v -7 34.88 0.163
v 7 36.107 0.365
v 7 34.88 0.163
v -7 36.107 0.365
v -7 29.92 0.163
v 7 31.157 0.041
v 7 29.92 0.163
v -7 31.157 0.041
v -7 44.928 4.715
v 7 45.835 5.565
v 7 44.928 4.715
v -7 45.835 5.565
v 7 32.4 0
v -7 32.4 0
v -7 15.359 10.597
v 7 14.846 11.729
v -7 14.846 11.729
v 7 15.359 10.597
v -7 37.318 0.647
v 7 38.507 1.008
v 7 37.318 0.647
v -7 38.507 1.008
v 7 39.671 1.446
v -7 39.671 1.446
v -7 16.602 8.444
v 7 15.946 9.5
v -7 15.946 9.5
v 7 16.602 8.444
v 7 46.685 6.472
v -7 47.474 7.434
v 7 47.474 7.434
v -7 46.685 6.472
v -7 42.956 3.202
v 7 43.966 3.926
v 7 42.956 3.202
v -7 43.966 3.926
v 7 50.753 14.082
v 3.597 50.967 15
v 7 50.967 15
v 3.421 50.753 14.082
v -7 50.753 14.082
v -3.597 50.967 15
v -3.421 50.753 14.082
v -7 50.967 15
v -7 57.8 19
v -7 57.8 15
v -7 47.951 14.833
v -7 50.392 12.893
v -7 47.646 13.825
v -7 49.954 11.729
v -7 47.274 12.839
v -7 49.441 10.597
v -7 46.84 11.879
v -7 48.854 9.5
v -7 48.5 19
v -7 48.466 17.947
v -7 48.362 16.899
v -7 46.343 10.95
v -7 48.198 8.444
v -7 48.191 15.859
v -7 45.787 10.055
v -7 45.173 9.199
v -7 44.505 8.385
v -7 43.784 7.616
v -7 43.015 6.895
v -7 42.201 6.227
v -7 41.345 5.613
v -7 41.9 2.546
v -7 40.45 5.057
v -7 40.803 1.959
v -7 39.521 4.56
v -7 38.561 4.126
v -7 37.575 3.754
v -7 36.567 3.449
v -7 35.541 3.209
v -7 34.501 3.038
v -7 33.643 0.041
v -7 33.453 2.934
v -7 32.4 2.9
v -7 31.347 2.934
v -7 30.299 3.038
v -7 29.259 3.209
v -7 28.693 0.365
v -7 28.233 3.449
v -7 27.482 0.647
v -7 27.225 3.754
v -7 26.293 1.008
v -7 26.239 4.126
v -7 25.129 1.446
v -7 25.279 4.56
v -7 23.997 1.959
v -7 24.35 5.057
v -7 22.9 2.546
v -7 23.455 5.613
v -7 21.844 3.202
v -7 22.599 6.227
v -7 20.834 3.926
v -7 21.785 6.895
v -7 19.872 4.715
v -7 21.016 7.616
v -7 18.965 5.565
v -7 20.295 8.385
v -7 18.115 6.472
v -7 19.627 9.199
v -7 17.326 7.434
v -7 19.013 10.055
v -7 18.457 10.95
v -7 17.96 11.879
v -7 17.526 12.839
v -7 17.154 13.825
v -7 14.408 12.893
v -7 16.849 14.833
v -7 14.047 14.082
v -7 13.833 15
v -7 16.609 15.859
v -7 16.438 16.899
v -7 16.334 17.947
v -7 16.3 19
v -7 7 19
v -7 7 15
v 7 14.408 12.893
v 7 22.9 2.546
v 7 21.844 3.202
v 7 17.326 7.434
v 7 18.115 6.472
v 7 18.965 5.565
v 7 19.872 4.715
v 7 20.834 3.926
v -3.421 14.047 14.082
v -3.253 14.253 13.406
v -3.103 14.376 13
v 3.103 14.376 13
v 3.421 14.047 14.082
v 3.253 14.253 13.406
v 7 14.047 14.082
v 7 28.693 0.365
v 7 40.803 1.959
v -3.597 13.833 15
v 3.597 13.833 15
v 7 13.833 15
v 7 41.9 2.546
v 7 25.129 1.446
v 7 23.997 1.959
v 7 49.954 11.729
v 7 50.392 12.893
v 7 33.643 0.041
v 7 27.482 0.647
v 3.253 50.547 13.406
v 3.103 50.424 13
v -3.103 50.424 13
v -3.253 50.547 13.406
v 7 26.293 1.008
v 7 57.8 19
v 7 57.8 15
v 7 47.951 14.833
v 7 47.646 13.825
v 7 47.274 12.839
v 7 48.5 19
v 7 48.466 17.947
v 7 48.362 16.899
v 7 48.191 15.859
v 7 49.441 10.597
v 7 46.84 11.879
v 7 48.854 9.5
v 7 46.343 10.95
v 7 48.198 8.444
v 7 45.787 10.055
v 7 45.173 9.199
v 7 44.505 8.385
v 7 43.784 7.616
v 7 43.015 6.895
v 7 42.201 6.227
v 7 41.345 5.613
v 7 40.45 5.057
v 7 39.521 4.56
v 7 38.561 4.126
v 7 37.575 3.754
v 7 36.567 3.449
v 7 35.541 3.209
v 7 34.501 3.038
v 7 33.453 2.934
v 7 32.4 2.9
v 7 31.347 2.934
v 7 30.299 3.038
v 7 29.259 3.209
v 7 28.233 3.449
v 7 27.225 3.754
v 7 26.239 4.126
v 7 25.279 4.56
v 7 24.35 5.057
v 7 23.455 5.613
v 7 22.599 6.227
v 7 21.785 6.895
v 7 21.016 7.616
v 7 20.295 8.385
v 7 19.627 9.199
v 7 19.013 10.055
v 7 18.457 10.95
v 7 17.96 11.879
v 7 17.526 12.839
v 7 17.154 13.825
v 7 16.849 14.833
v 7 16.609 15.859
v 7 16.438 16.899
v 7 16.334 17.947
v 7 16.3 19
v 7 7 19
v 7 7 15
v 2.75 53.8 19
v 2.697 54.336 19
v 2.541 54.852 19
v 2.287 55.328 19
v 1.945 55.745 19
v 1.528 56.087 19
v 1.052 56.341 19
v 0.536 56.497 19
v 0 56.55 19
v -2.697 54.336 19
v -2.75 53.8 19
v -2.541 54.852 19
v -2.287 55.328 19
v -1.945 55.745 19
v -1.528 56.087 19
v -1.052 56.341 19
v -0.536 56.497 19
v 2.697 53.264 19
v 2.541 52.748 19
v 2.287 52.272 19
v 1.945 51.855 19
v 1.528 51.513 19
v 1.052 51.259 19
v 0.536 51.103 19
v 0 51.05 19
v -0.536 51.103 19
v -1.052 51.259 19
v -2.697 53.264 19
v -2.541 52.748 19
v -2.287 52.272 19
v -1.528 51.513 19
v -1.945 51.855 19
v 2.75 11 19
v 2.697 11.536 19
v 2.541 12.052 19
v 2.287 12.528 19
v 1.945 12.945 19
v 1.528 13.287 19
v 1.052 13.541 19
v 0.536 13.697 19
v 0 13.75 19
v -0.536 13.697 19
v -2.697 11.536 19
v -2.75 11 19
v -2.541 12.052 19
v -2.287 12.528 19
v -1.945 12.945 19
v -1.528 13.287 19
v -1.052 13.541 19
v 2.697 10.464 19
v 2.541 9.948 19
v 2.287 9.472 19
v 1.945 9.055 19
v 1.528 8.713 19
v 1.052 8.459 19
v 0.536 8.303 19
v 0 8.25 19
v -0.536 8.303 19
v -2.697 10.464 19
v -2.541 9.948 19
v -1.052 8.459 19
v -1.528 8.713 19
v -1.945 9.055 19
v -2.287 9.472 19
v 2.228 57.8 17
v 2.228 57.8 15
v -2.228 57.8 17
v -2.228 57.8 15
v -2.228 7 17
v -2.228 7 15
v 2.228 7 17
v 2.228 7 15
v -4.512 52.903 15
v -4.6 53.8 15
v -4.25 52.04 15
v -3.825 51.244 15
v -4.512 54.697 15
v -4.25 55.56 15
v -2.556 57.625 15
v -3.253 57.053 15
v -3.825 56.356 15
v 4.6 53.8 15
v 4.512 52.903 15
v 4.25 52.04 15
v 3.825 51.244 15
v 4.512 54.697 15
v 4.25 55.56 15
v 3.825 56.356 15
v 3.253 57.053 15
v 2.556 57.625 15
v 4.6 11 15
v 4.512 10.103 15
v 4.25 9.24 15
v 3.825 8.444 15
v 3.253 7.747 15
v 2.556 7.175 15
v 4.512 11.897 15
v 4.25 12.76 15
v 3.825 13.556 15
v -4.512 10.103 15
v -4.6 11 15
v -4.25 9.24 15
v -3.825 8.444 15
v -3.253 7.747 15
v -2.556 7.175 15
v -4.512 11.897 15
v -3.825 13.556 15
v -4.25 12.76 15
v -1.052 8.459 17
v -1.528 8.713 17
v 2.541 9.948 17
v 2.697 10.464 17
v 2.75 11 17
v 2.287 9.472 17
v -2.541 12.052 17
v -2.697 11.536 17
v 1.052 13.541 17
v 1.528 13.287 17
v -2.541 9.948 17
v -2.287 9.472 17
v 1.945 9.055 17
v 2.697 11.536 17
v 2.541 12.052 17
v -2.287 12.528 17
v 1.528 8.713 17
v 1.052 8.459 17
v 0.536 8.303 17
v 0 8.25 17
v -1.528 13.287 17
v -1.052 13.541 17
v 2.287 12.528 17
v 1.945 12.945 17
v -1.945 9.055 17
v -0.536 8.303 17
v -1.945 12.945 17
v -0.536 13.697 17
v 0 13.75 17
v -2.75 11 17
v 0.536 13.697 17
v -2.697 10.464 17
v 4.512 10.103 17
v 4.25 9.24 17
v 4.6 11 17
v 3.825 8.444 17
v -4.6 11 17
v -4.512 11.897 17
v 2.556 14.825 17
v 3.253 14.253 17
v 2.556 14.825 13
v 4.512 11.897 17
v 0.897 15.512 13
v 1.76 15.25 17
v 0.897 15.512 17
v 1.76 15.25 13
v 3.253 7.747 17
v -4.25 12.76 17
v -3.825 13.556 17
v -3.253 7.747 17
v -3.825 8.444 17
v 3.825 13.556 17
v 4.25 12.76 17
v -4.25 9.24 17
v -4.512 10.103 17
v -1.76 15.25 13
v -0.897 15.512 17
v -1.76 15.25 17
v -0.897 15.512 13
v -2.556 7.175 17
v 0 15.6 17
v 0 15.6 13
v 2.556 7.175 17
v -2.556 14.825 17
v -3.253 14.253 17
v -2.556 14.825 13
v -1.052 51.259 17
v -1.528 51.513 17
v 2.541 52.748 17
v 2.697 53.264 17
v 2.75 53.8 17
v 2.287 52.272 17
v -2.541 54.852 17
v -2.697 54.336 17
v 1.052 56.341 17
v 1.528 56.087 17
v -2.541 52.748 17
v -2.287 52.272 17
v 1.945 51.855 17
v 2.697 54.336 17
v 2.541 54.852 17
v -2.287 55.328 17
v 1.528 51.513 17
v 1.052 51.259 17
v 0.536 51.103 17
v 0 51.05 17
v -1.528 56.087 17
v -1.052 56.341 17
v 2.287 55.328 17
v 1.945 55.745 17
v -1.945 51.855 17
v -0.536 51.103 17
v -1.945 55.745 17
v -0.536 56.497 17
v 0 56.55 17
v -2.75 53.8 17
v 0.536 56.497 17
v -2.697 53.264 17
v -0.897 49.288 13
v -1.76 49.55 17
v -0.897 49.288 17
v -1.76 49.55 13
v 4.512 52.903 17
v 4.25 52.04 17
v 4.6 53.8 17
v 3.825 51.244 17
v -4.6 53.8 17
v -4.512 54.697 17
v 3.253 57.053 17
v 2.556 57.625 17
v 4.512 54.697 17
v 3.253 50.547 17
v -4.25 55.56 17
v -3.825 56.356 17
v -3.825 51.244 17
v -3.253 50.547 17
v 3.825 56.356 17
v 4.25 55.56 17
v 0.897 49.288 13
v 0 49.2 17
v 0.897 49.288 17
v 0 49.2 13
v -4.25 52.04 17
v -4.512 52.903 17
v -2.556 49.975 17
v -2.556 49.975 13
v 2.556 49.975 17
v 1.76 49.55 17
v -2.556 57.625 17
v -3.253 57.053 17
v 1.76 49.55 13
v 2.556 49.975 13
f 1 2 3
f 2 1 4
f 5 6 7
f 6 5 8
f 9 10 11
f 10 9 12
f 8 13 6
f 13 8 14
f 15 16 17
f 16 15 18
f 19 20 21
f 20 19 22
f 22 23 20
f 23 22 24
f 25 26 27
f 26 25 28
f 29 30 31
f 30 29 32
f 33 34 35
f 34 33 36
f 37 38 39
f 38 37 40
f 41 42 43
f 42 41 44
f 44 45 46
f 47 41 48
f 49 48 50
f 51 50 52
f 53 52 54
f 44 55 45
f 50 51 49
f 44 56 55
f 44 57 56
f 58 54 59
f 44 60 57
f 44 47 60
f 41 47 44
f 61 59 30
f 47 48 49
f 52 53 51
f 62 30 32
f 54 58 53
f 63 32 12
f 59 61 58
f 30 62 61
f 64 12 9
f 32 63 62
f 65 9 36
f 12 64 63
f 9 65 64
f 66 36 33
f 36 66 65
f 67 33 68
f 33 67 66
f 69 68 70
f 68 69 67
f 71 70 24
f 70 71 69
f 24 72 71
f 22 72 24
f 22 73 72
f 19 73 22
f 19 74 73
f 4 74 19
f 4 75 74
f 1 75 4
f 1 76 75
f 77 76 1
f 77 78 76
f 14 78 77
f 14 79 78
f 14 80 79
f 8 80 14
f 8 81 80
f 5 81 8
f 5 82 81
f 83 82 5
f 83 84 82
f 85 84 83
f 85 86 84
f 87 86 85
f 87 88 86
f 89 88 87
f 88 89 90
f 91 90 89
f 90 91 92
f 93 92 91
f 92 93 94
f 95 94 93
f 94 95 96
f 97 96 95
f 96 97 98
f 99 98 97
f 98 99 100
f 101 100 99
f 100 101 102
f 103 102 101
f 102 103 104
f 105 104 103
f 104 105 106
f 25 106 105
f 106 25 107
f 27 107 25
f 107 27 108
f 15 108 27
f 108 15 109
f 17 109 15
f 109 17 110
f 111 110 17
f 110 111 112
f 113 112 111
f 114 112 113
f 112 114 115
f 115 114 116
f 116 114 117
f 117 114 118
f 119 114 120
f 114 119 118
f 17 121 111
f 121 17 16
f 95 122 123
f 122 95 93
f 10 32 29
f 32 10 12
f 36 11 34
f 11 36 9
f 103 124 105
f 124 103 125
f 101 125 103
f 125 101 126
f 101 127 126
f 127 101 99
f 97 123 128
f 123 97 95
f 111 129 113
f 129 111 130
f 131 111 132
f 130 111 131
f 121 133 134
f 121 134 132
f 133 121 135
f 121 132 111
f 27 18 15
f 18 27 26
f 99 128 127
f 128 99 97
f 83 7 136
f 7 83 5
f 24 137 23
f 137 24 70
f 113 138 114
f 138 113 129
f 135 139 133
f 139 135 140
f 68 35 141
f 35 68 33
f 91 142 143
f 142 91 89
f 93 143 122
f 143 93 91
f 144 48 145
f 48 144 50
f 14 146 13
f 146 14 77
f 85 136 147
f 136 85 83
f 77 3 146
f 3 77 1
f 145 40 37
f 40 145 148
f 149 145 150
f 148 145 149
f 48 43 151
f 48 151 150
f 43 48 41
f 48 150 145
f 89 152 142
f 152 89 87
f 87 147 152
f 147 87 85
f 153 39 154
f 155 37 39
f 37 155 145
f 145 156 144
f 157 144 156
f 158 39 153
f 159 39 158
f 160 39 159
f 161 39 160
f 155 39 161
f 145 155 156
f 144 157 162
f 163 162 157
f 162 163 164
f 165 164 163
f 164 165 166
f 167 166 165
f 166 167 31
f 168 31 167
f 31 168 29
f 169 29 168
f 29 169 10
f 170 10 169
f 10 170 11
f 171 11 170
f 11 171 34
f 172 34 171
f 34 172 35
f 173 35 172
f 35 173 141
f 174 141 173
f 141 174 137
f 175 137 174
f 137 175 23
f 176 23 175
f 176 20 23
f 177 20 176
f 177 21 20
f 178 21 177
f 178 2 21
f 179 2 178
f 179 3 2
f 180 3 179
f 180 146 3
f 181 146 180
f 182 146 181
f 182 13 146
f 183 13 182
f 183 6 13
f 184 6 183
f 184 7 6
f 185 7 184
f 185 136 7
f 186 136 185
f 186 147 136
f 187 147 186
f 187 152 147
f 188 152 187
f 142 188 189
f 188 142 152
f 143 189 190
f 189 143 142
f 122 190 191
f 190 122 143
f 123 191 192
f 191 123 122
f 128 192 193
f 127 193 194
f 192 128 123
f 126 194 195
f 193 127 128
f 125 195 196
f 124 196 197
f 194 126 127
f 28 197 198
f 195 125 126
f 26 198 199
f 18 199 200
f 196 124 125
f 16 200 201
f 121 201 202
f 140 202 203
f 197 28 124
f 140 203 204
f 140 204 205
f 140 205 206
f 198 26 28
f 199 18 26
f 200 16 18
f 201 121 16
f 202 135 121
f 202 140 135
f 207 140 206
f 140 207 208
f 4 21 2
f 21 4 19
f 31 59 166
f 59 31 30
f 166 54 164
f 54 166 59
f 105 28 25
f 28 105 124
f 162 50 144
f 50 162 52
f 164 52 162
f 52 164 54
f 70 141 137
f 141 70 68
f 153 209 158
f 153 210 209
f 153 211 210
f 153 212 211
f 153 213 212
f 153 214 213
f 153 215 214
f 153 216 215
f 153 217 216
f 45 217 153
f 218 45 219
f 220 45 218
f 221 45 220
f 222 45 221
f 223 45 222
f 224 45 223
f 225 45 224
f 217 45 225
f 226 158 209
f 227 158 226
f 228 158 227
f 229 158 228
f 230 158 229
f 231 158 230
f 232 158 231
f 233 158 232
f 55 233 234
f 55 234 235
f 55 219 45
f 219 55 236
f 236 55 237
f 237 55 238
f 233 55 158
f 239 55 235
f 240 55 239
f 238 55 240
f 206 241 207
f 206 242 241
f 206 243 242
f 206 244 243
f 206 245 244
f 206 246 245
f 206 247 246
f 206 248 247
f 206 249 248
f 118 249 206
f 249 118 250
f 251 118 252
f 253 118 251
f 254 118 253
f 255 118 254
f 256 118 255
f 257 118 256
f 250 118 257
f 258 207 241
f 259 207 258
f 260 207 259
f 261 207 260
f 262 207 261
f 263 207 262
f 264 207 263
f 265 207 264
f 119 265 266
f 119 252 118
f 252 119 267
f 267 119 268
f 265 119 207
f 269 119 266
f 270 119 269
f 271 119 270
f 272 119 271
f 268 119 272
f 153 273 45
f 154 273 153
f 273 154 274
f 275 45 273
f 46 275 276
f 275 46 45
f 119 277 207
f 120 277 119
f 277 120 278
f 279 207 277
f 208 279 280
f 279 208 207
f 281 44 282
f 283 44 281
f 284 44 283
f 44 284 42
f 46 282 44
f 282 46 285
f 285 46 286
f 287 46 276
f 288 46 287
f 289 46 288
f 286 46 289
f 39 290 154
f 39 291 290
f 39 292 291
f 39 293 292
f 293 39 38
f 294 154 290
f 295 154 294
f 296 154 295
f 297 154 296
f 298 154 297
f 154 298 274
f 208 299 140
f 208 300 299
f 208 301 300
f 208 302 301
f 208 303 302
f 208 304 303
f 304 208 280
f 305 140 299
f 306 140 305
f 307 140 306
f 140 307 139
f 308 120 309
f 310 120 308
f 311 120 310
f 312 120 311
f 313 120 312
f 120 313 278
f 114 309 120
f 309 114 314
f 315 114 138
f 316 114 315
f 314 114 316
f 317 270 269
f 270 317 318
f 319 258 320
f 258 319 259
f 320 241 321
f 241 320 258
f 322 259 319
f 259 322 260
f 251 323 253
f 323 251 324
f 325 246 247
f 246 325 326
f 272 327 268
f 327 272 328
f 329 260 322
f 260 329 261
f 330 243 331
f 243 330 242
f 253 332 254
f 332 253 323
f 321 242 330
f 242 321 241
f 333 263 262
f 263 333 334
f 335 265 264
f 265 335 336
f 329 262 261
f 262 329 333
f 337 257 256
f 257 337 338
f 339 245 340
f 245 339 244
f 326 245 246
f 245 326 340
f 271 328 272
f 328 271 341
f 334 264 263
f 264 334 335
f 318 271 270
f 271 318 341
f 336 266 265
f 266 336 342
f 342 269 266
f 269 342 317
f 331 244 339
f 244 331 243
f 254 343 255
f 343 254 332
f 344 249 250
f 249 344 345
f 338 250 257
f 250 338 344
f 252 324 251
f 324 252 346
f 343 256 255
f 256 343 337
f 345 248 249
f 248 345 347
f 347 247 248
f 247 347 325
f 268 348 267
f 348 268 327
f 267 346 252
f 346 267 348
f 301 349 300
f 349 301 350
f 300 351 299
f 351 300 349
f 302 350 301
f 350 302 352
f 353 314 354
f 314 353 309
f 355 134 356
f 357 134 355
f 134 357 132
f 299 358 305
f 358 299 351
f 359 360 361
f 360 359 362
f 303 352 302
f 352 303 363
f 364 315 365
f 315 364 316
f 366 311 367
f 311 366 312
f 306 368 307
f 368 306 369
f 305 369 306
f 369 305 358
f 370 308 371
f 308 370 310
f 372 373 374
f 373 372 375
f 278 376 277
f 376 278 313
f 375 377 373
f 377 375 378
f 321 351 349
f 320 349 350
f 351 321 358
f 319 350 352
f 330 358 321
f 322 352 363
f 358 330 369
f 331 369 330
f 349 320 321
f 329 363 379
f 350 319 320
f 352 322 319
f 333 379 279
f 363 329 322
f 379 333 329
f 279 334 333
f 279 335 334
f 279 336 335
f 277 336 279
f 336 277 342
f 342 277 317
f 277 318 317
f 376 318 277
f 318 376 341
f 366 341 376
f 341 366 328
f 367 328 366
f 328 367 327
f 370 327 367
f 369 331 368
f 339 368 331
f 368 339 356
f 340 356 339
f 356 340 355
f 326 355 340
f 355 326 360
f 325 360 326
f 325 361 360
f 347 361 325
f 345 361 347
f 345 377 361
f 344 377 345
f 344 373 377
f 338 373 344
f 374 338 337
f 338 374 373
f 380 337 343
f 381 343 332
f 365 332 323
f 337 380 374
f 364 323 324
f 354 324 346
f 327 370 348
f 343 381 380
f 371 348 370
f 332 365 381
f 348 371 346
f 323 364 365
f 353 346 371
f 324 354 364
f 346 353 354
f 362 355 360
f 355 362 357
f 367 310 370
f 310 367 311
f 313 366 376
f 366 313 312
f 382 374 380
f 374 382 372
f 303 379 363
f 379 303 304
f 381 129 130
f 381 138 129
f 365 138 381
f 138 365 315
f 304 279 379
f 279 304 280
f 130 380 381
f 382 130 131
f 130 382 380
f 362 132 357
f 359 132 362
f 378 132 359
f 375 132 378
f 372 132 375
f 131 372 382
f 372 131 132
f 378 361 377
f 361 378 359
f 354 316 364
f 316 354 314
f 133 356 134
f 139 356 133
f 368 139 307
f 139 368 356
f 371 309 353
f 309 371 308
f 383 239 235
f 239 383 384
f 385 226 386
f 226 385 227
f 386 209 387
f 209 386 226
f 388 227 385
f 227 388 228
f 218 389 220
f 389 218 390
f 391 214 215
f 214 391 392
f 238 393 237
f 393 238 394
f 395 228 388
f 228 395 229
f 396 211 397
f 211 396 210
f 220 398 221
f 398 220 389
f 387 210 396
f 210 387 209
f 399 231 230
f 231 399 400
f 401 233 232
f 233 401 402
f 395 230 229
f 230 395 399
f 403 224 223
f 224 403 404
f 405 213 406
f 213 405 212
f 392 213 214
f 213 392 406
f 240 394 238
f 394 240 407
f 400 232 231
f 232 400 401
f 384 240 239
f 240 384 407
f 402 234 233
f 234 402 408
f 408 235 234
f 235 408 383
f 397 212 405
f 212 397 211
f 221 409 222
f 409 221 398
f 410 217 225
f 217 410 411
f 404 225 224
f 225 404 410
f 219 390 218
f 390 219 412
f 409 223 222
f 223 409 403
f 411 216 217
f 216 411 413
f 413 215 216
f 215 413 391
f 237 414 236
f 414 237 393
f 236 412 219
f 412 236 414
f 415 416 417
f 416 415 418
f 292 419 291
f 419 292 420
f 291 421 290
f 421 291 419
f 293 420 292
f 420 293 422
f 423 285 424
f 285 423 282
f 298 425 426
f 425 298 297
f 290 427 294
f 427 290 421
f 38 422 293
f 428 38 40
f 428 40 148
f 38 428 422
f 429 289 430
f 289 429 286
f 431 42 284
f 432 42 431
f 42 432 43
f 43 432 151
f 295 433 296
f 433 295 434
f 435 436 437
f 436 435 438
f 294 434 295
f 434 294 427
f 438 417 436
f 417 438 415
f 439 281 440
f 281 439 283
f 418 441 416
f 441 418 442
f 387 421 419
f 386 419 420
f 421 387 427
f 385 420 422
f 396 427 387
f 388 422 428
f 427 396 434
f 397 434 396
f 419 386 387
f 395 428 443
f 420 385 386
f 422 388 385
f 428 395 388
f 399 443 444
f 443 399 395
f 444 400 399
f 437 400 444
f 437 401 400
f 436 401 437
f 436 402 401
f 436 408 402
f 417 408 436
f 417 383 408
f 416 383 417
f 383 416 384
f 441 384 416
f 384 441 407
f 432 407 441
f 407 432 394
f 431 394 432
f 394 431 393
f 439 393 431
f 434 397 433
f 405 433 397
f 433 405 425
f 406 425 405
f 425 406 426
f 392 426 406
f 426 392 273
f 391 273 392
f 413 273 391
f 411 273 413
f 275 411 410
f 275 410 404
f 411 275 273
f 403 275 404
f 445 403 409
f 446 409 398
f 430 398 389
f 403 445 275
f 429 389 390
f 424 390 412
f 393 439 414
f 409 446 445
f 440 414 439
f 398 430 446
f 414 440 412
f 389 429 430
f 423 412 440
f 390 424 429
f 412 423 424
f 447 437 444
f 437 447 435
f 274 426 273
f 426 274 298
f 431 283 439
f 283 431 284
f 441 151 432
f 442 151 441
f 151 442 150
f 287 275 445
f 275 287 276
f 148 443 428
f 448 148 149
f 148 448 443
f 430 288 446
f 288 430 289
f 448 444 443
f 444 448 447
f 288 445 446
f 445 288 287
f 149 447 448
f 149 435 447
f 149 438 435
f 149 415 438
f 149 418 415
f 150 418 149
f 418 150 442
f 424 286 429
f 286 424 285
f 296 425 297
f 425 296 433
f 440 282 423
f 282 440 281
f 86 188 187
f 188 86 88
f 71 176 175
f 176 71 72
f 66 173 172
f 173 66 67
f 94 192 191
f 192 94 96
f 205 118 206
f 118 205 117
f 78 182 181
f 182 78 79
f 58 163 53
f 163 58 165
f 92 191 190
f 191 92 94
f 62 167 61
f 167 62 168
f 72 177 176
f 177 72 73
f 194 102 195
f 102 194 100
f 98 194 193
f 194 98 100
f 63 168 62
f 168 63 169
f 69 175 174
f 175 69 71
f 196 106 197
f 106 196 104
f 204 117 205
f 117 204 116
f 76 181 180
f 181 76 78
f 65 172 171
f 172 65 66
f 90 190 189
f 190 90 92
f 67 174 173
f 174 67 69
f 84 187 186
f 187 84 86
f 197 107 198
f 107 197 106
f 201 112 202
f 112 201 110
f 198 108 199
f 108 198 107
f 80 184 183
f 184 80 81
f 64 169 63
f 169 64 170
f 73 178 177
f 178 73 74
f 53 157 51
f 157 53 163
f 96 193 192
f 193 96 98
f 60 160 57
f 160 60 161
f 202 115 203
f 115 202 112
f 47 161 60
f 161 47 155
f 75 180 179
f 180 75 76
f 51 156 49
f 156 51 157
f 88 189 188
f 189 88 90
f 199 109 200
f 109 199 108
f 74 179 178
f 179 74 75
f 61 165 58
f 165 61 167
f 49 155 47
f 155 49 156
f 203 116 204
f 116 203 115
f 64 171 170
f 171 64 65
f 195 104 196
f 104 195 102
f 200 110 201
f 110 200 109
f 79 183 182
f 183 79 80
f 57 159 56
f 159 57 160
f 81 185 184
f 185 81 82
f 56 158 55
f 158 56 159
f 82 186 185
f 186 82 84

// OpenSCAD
include <../lib/meshtastic-drybag-node-lib.scad>;
$fn = 40;
battery_strap_print();
